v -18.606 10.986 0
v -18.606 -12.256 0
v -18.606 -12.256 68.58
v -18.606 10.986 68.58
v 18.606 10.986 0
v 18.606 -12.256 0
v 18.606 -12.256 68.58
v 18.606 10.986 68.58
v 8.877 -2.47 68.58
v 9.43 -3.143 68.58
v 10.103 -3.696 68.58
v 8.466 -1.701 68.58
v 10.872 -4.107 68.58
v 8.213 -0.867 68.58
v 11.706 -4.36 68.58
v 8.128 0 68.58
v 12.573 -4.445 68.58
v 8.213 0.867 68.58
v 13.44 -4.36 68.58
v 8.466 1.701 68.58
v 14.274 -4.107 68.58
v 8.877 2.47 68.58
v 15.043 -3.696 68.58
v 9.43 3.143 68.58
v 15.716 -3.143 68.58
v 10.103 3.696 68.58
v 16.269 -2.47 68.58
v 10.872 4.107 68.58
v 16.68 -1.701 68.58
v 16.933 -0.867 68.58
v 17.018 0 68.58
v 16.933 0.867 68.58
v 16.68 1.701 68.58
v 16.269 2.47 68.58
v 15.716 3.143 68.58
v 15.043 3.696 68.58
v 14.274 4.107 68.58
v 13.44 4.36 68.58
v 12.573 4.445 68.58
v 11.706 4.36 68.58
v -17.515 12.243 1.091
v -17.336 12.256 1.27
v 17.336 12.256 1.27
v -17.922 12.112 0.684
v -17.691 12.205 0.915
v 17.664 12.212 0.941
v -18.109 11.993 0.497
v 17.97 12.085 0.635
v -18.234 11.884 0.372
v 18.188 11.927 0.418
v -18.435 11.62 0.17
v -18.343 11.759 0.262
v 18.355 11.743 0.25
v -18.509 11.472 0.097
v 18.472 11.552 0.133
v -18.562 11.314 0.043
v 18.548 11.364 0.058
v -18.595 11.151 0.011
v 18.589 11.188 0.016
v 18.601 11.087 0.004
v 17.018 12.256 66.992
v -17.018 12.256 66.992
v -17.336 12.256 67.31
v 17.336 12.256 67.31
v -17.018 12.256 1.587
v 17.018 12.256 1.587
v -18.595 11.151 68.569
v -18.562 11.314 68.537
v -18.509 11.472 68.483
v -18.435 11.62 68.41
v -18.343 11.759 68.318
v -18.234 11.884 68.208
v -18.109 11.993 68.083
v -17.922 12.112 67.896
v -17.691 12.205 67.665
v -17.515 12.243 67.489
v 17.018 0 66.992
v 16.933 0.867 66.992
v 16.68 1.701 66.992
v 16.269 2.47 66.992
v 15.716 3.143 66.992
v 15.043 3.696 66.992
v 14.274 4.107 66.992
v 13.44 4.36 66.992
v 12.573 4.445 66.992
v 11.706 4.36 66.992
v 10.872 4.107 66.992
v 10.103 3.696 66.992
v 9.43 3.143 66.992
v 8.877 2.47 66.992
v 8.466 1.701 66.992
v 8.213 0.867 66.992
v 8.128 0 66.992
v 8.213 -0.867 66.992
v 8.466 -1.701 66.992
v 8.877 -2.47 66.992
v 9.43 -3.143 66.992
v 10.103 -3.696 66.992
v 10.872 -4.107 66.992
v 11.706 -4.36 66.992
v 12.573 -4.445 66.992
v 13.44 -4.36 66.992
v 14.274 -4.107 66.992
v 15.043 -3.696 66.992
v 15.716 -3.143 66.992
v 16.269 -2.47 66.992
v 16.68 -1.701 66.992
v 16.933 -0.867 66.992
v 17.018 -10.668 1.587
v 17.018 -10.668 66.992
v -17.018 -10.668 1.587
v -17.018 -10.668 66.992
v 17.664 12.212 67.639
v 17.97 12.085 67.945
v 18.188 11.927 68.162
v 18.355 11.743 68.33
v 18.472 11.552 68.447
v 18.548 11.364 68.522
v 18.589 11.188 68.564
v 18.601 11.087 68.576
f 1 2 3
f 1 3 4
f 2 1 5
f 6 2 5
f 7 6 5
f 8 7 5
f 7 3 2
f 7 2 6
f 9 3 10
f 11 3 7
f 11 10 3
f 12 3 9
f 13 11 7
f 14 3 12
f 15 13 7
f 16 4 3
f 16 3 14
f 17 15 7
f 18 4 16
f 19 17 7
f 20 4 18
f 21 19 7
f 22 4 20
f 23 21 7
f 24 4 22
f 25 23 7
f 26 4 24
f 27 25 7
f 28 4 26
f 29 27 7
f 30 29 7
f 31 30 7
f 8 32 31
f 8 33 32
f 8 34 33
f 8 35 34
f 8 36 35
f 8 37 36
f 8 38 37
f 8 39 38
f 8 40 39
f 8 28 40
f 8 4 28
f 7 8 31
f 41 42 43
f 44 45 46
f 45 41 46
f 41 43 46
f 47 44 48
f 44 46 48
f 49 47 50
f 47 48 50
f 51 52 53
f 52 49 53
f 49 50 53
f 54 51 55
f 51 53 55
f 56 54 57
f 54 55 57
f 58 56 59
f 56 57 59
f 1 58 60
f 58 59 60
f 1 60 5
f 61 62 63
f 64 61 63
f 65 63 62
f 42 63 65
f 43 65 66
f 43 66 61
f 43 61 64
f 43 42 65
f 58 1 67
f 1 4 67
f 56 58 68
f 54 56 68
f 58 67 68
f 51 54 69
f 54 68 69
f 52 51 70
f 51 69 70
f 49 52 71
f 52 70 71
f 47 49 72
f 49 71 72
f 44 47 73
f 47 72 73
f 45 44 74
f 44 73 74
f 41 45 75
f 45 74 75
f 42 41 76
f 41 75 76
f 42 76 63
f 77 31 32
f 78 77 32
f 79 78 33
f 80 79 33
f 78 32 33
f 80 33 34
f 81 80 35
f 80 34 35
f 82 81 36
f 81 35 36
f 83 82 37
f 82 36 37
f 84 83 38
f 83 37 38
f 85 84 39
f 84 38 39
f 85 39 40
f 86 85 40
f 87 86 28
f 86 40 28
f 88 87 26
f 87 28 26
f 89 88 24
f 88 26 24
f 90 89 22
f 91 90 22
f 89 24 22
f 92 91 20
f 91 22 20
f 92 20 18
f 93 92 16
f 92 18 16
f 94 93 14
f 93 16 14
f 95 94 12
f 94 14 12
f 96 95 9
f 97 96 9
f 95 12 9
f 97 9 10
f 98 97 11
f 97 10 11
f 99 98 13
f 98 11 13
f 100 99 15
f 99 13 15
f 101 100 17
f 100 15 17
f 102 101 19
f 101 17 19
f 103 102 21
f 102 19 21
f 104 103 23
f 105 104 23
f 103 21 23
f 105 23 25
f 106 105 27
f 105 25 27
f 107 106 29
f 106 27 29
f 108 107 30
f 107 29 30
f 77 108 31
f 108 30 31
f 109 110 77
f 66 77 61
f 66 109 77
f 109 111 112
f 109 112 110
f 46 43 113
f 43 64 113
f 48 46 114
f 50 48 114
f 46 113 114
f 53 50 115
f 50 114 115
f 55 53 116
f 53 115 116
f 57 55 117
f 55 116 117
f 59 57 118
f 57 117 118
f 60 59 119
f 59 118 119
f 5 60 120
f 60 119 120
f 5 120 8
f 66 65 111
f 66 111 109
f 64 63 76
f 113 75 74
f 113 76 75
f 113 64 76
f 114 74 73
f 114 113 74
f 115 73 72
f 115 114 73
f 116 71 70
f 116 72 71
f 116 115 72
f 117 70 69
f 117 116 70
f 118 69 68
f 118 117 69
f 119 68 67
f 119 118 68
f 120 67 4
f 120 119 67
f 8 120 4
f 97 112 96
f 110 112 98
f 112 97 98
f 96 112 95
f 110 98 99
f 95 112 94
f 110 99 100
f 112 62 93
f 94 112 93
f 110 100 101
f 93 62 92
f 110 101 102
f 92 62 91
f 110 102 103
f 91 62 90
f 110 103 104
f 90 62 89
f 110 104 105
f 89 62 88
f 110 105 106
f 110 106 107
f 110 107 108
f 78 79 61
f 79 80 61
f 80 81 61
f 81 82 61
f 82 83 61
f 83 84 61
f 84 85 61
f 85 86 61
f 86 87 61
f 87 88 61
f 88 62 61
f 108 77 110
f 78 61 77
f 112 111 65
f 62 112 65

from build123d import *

# Parameters (mm, degrees)
F0_W     = 37.211
F0_H     = 24.511
F1_DEPTH = 68.58
F2_T     = -1.5875
F3_R     = 4.445
F4_DEPTH = 1.5875
F5_R     = 1.27


with BuildPart() as f1:
    # F0 (on Top) → F1 (new body)
    with BuildSketch(Plane.XY):
        Rectangle(F0_W, F0_H)
    extrude(amount=F1_DEPTH)

    # F2
    f2_openings = [f1.faces().sort_by_distance(p)[0] for p in [
        (0, 12.2555, 34.29),
    ]]
    offset(amount=F2_T, openings=f2_openings)

    # F3 (on face) → F4 (cut)
    with BuildSketch(Plane.XY.offset(68.58)):
        with Locations((12.573, 0)):
            Circle(F3_R)
    extrude(amount=-F4_DEPTH, mode=Mode.SUBTRACT)

    # F5
    f5_edges = [f1.edges().sort_by_distance(p)[0] for p in [
        (-18.6055, 12.2555, 34.29),
        (0, 12.2555, 68.58),
        (18.6055, 12.2555, 34.29),
        (0, 12.2555, 0),
    ]]
    fillet(f5_edges, radius=F5_R)


solid = f1.part
